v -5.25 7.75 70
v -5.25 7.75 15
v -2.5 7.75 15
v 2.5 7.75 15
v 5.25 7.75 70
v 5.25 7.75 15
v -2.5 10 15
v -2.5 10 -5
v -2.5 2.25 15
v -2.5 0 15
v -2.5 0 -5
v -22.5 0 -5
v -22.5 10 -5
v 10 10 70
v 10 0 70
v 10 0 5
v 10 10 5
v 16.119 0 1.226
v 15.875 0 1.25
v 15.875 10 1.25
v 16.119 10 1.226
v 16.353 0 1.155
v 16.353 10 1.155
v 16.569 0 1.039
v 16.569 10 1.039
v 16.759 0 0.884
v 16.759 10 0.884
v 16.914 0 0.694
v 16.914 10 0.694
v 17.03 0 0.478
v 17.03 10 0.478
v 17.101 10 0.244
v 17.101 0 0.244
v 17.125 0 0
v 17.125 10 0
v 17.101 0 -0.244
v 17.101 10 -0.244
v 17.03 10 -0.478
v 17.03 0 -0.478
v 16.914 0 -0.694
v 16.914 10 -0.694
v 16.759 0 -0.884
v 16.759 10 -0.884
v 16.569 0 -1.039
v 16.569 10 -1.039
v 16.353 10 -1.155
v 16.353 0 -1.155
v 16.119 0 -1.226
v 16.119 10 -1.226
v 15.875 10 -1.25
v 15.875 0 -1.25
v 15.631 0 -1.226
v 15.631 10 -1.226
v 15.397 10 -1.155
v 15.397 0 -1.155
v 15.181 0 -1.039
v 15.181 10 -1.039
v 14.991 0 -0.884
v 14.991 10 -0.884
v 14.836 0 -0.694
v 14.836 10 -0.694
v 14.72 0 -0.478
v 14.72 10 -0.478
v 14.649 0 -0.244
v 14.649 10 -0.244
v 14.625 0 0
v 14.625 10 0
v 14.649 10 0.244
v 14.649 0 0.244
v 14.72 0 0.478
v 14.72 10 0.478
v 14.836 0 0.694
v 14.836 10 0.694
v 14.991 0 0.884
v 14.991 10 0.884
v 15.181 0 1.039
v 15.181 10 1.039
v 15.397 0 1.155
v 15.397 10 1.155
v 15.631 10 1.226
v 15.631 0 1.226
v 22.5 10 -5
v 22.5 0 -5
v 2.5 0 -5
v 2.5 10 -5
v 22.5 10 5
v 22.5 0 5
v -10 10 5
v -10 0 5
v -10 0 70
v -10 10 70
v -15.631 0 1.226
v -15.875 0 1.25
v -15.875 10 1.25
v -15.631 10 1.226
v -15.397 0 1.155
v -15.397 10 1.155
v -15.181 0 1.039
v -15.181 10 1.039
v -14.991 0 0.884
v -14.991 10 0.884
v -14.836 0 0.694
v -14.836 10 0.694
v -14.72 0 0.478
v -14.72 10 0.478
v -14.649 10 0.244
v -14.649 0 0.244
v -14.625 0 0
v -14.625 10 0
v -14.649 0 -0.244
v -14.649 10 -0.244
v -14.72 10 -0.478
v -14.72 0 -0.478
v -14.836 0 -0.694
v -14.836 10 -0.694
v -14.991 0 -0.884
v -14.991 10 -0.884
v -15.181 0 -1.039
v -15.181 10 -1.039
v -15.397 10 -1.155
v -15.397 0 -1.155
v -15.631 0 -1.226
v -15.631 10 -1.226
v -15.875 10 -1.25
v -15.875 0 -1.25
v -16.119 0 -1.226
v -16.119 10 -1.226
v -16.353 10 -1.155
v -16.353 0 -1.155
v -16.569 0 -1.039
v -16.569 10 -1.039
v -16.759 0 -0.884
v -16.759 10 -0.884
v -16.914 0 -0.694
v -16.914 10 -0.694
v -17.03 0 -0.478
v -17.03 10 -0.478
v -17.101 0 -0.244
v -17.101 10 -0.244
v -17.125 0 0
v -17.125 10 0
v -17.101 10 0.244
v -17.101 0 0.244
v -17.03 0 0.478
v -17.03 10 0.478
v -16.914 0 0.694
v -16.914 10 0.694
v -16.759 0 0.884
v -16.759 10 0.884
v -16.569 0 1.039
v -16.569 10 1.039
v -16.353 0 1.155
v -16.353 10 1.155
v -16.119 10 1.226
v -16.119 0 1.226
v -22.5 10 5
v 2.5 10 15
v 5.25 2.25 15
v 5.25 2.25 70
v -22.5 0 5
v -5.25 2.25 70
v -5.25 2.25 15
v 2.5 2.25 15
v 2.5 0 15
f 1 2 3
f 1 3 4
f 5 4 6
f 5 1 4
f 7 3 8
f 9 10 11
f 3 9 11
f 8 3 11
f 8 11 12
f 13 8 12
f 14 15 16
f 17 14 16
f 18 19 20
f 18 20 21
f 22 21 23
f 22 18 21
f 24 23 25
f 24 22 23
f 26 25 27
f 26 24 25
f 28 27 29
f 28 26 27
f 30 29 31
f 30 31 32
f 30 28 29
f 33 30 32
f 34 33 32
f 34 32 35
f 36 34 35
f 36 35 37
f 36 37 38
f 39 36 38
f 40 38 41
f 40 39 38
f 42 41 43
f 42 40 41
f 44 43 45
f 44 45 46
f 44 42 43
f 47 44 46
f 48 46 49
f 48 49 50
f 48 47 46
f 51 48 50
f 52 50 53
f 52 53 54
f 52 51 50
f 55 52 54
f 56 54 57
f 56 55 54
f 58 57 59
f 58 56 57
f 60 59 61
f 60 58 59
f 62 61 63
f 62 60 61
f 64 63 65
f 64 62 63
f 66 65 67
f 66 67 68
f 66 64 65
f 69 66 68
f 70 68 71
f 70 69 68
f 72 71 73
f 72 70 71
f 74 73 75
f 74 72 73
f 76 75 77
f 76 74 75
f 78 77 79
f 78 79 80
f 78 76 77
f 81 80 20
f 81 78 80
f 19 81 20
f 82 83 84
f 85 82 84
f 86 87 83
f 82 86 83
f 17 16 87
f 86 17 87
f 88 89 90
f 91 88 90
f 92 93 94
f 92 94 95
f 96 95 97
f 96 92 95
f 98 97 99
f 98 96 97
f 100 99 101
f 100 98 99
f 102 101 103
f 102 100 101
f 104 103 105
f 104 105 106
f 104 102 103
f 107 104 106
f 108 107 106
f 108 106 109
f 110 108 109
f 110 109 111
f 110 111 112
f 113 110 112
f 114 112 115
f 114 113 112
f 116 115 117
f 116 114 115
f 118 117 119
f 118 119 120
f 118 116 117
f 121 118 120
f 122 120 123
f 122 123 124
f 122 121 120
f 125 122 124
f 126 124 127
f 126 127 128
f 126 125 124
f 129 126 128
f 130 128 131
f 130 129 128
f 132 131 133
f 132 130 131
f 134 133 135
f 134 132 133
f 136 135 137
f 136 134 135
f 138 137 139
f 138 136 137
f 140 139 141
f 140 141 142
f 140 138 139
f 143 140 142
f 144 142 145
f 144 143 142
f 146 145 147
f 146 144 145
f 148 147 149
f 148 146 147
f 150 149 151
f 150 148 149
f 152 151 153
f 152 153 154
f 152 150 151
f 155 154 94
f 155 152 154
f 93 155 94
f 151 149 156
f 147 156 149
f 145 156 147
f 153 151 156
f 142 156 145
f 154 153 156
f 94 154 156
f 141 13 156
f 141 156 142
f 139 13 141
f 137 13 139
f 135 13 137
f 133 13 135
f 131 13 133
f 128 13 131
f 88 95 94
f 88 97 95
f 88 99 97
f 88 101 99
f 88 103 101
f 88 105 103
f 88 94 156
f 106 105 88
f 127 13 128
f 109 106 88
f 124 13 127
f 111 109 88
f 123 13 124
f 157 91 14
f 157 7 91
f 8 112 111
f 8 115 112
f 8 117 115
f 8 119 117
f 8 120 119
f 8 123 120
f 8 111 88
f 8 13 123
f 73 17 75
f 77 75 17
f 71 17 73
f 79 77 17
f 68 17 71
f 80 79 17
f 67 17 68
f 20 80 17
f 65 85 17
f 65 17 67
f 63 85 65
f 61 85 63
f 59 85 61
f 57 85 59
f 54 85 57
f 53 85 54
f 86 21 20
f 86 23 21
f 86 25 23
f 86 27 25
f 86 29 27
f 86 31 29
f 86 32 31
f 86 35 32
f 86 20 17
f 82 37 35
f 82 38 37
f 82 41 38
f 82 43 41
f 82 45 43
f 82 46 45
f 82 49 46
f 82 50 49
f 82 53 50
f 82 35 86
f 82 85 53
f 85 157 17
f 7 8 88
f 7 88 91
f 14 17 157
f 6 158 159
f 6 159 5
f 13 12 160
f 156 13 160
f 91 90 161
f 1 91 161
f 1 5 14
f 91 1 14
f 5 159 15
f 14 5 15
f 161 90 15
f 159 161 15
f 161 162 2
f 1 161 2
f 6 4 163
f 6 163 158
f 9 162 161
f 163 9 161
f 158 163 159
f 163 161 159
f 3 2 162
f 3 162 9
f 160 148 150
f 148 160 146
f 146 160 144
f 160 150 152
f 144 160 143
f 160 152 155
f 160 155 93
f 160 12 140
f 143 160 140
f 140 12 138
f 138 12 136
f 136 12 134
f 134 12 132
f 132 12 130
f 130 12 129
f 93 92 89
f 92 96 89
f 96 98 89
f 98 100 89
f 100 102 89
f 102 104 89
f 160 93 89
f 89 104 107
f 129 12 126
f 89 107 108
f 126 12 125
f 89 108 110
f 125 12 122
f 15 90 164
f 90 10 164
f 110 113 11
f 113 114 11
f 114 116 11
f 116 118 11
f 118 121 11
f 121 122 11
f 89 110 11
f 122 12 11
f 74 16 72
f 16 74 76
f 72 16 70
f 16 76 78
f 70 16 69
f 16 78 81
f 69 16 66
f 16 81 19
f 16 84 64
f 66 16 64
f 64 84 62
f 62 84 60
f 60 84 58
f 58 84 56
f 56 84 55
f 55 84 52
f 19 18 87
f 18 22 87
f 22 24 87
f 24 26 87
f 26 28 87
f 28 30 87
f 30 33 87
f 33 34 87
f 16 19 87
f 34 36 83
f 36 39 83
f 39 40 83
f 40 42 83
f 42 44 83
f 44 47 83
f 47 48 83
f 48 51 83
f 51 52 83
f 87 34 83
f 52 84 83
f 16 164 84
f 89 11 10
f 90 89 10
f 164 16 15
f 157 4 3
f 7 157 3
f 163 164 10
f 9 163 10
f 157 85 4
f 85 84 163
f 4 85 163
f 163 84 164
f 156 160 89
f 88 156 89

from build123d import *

# Parameters (mm, degrees)
SKETCH1_R           = 1.25
BOSS_EXTRUDE1_DEPTH = 10
SKETCH2_W           = 10.5
SKETCH2_H           = 5.5
CUT_EXTRUDE1_DEPTH  = 55


with BuildPart() as part:
    # Sketch1 → Boss-Extrude1 (new body)
    with BuildSketch(Plane(origin=(0, 0, 0), x_dir=(1, 0, 0), z_dir=(0, 1, 0))):
        Polygon((10, -5), (22.5, -5), (22.5, 5), (2.5, 5), (2.5, -15), (-2.5, -15), (-2.5, 5), (-22.5, 5), (-22.5, -5), (-10, -5), (-10, -70), (10, -70), align=None)
        with Locations(Location((-15.875, 0, 0), (0, 0, 270))):
            Circle(SKETCH1_R, mode=Mode.SUBTRACT)
        with Locations(Location((15.875, 0, 0), (0, 0, 270))):
            Circle(SKETCH1_R, mode=Mode.SUBTRACT)
    extrude(amount=BOSS_EXTRUDE1_DEPTH)

    # Sketch2 → Cut-Extrude1 (cut)
    with BuildSketch(Plane.XY.offset(70)):
        with Locations((0, 5)):
            Rectangle(SKETCH2_W, SKETCH2_H)
    extrude(amount=-CUT_EXTRUDE1_DEPTH, mode=Mode.SUBTRACT)


solid = part.part
